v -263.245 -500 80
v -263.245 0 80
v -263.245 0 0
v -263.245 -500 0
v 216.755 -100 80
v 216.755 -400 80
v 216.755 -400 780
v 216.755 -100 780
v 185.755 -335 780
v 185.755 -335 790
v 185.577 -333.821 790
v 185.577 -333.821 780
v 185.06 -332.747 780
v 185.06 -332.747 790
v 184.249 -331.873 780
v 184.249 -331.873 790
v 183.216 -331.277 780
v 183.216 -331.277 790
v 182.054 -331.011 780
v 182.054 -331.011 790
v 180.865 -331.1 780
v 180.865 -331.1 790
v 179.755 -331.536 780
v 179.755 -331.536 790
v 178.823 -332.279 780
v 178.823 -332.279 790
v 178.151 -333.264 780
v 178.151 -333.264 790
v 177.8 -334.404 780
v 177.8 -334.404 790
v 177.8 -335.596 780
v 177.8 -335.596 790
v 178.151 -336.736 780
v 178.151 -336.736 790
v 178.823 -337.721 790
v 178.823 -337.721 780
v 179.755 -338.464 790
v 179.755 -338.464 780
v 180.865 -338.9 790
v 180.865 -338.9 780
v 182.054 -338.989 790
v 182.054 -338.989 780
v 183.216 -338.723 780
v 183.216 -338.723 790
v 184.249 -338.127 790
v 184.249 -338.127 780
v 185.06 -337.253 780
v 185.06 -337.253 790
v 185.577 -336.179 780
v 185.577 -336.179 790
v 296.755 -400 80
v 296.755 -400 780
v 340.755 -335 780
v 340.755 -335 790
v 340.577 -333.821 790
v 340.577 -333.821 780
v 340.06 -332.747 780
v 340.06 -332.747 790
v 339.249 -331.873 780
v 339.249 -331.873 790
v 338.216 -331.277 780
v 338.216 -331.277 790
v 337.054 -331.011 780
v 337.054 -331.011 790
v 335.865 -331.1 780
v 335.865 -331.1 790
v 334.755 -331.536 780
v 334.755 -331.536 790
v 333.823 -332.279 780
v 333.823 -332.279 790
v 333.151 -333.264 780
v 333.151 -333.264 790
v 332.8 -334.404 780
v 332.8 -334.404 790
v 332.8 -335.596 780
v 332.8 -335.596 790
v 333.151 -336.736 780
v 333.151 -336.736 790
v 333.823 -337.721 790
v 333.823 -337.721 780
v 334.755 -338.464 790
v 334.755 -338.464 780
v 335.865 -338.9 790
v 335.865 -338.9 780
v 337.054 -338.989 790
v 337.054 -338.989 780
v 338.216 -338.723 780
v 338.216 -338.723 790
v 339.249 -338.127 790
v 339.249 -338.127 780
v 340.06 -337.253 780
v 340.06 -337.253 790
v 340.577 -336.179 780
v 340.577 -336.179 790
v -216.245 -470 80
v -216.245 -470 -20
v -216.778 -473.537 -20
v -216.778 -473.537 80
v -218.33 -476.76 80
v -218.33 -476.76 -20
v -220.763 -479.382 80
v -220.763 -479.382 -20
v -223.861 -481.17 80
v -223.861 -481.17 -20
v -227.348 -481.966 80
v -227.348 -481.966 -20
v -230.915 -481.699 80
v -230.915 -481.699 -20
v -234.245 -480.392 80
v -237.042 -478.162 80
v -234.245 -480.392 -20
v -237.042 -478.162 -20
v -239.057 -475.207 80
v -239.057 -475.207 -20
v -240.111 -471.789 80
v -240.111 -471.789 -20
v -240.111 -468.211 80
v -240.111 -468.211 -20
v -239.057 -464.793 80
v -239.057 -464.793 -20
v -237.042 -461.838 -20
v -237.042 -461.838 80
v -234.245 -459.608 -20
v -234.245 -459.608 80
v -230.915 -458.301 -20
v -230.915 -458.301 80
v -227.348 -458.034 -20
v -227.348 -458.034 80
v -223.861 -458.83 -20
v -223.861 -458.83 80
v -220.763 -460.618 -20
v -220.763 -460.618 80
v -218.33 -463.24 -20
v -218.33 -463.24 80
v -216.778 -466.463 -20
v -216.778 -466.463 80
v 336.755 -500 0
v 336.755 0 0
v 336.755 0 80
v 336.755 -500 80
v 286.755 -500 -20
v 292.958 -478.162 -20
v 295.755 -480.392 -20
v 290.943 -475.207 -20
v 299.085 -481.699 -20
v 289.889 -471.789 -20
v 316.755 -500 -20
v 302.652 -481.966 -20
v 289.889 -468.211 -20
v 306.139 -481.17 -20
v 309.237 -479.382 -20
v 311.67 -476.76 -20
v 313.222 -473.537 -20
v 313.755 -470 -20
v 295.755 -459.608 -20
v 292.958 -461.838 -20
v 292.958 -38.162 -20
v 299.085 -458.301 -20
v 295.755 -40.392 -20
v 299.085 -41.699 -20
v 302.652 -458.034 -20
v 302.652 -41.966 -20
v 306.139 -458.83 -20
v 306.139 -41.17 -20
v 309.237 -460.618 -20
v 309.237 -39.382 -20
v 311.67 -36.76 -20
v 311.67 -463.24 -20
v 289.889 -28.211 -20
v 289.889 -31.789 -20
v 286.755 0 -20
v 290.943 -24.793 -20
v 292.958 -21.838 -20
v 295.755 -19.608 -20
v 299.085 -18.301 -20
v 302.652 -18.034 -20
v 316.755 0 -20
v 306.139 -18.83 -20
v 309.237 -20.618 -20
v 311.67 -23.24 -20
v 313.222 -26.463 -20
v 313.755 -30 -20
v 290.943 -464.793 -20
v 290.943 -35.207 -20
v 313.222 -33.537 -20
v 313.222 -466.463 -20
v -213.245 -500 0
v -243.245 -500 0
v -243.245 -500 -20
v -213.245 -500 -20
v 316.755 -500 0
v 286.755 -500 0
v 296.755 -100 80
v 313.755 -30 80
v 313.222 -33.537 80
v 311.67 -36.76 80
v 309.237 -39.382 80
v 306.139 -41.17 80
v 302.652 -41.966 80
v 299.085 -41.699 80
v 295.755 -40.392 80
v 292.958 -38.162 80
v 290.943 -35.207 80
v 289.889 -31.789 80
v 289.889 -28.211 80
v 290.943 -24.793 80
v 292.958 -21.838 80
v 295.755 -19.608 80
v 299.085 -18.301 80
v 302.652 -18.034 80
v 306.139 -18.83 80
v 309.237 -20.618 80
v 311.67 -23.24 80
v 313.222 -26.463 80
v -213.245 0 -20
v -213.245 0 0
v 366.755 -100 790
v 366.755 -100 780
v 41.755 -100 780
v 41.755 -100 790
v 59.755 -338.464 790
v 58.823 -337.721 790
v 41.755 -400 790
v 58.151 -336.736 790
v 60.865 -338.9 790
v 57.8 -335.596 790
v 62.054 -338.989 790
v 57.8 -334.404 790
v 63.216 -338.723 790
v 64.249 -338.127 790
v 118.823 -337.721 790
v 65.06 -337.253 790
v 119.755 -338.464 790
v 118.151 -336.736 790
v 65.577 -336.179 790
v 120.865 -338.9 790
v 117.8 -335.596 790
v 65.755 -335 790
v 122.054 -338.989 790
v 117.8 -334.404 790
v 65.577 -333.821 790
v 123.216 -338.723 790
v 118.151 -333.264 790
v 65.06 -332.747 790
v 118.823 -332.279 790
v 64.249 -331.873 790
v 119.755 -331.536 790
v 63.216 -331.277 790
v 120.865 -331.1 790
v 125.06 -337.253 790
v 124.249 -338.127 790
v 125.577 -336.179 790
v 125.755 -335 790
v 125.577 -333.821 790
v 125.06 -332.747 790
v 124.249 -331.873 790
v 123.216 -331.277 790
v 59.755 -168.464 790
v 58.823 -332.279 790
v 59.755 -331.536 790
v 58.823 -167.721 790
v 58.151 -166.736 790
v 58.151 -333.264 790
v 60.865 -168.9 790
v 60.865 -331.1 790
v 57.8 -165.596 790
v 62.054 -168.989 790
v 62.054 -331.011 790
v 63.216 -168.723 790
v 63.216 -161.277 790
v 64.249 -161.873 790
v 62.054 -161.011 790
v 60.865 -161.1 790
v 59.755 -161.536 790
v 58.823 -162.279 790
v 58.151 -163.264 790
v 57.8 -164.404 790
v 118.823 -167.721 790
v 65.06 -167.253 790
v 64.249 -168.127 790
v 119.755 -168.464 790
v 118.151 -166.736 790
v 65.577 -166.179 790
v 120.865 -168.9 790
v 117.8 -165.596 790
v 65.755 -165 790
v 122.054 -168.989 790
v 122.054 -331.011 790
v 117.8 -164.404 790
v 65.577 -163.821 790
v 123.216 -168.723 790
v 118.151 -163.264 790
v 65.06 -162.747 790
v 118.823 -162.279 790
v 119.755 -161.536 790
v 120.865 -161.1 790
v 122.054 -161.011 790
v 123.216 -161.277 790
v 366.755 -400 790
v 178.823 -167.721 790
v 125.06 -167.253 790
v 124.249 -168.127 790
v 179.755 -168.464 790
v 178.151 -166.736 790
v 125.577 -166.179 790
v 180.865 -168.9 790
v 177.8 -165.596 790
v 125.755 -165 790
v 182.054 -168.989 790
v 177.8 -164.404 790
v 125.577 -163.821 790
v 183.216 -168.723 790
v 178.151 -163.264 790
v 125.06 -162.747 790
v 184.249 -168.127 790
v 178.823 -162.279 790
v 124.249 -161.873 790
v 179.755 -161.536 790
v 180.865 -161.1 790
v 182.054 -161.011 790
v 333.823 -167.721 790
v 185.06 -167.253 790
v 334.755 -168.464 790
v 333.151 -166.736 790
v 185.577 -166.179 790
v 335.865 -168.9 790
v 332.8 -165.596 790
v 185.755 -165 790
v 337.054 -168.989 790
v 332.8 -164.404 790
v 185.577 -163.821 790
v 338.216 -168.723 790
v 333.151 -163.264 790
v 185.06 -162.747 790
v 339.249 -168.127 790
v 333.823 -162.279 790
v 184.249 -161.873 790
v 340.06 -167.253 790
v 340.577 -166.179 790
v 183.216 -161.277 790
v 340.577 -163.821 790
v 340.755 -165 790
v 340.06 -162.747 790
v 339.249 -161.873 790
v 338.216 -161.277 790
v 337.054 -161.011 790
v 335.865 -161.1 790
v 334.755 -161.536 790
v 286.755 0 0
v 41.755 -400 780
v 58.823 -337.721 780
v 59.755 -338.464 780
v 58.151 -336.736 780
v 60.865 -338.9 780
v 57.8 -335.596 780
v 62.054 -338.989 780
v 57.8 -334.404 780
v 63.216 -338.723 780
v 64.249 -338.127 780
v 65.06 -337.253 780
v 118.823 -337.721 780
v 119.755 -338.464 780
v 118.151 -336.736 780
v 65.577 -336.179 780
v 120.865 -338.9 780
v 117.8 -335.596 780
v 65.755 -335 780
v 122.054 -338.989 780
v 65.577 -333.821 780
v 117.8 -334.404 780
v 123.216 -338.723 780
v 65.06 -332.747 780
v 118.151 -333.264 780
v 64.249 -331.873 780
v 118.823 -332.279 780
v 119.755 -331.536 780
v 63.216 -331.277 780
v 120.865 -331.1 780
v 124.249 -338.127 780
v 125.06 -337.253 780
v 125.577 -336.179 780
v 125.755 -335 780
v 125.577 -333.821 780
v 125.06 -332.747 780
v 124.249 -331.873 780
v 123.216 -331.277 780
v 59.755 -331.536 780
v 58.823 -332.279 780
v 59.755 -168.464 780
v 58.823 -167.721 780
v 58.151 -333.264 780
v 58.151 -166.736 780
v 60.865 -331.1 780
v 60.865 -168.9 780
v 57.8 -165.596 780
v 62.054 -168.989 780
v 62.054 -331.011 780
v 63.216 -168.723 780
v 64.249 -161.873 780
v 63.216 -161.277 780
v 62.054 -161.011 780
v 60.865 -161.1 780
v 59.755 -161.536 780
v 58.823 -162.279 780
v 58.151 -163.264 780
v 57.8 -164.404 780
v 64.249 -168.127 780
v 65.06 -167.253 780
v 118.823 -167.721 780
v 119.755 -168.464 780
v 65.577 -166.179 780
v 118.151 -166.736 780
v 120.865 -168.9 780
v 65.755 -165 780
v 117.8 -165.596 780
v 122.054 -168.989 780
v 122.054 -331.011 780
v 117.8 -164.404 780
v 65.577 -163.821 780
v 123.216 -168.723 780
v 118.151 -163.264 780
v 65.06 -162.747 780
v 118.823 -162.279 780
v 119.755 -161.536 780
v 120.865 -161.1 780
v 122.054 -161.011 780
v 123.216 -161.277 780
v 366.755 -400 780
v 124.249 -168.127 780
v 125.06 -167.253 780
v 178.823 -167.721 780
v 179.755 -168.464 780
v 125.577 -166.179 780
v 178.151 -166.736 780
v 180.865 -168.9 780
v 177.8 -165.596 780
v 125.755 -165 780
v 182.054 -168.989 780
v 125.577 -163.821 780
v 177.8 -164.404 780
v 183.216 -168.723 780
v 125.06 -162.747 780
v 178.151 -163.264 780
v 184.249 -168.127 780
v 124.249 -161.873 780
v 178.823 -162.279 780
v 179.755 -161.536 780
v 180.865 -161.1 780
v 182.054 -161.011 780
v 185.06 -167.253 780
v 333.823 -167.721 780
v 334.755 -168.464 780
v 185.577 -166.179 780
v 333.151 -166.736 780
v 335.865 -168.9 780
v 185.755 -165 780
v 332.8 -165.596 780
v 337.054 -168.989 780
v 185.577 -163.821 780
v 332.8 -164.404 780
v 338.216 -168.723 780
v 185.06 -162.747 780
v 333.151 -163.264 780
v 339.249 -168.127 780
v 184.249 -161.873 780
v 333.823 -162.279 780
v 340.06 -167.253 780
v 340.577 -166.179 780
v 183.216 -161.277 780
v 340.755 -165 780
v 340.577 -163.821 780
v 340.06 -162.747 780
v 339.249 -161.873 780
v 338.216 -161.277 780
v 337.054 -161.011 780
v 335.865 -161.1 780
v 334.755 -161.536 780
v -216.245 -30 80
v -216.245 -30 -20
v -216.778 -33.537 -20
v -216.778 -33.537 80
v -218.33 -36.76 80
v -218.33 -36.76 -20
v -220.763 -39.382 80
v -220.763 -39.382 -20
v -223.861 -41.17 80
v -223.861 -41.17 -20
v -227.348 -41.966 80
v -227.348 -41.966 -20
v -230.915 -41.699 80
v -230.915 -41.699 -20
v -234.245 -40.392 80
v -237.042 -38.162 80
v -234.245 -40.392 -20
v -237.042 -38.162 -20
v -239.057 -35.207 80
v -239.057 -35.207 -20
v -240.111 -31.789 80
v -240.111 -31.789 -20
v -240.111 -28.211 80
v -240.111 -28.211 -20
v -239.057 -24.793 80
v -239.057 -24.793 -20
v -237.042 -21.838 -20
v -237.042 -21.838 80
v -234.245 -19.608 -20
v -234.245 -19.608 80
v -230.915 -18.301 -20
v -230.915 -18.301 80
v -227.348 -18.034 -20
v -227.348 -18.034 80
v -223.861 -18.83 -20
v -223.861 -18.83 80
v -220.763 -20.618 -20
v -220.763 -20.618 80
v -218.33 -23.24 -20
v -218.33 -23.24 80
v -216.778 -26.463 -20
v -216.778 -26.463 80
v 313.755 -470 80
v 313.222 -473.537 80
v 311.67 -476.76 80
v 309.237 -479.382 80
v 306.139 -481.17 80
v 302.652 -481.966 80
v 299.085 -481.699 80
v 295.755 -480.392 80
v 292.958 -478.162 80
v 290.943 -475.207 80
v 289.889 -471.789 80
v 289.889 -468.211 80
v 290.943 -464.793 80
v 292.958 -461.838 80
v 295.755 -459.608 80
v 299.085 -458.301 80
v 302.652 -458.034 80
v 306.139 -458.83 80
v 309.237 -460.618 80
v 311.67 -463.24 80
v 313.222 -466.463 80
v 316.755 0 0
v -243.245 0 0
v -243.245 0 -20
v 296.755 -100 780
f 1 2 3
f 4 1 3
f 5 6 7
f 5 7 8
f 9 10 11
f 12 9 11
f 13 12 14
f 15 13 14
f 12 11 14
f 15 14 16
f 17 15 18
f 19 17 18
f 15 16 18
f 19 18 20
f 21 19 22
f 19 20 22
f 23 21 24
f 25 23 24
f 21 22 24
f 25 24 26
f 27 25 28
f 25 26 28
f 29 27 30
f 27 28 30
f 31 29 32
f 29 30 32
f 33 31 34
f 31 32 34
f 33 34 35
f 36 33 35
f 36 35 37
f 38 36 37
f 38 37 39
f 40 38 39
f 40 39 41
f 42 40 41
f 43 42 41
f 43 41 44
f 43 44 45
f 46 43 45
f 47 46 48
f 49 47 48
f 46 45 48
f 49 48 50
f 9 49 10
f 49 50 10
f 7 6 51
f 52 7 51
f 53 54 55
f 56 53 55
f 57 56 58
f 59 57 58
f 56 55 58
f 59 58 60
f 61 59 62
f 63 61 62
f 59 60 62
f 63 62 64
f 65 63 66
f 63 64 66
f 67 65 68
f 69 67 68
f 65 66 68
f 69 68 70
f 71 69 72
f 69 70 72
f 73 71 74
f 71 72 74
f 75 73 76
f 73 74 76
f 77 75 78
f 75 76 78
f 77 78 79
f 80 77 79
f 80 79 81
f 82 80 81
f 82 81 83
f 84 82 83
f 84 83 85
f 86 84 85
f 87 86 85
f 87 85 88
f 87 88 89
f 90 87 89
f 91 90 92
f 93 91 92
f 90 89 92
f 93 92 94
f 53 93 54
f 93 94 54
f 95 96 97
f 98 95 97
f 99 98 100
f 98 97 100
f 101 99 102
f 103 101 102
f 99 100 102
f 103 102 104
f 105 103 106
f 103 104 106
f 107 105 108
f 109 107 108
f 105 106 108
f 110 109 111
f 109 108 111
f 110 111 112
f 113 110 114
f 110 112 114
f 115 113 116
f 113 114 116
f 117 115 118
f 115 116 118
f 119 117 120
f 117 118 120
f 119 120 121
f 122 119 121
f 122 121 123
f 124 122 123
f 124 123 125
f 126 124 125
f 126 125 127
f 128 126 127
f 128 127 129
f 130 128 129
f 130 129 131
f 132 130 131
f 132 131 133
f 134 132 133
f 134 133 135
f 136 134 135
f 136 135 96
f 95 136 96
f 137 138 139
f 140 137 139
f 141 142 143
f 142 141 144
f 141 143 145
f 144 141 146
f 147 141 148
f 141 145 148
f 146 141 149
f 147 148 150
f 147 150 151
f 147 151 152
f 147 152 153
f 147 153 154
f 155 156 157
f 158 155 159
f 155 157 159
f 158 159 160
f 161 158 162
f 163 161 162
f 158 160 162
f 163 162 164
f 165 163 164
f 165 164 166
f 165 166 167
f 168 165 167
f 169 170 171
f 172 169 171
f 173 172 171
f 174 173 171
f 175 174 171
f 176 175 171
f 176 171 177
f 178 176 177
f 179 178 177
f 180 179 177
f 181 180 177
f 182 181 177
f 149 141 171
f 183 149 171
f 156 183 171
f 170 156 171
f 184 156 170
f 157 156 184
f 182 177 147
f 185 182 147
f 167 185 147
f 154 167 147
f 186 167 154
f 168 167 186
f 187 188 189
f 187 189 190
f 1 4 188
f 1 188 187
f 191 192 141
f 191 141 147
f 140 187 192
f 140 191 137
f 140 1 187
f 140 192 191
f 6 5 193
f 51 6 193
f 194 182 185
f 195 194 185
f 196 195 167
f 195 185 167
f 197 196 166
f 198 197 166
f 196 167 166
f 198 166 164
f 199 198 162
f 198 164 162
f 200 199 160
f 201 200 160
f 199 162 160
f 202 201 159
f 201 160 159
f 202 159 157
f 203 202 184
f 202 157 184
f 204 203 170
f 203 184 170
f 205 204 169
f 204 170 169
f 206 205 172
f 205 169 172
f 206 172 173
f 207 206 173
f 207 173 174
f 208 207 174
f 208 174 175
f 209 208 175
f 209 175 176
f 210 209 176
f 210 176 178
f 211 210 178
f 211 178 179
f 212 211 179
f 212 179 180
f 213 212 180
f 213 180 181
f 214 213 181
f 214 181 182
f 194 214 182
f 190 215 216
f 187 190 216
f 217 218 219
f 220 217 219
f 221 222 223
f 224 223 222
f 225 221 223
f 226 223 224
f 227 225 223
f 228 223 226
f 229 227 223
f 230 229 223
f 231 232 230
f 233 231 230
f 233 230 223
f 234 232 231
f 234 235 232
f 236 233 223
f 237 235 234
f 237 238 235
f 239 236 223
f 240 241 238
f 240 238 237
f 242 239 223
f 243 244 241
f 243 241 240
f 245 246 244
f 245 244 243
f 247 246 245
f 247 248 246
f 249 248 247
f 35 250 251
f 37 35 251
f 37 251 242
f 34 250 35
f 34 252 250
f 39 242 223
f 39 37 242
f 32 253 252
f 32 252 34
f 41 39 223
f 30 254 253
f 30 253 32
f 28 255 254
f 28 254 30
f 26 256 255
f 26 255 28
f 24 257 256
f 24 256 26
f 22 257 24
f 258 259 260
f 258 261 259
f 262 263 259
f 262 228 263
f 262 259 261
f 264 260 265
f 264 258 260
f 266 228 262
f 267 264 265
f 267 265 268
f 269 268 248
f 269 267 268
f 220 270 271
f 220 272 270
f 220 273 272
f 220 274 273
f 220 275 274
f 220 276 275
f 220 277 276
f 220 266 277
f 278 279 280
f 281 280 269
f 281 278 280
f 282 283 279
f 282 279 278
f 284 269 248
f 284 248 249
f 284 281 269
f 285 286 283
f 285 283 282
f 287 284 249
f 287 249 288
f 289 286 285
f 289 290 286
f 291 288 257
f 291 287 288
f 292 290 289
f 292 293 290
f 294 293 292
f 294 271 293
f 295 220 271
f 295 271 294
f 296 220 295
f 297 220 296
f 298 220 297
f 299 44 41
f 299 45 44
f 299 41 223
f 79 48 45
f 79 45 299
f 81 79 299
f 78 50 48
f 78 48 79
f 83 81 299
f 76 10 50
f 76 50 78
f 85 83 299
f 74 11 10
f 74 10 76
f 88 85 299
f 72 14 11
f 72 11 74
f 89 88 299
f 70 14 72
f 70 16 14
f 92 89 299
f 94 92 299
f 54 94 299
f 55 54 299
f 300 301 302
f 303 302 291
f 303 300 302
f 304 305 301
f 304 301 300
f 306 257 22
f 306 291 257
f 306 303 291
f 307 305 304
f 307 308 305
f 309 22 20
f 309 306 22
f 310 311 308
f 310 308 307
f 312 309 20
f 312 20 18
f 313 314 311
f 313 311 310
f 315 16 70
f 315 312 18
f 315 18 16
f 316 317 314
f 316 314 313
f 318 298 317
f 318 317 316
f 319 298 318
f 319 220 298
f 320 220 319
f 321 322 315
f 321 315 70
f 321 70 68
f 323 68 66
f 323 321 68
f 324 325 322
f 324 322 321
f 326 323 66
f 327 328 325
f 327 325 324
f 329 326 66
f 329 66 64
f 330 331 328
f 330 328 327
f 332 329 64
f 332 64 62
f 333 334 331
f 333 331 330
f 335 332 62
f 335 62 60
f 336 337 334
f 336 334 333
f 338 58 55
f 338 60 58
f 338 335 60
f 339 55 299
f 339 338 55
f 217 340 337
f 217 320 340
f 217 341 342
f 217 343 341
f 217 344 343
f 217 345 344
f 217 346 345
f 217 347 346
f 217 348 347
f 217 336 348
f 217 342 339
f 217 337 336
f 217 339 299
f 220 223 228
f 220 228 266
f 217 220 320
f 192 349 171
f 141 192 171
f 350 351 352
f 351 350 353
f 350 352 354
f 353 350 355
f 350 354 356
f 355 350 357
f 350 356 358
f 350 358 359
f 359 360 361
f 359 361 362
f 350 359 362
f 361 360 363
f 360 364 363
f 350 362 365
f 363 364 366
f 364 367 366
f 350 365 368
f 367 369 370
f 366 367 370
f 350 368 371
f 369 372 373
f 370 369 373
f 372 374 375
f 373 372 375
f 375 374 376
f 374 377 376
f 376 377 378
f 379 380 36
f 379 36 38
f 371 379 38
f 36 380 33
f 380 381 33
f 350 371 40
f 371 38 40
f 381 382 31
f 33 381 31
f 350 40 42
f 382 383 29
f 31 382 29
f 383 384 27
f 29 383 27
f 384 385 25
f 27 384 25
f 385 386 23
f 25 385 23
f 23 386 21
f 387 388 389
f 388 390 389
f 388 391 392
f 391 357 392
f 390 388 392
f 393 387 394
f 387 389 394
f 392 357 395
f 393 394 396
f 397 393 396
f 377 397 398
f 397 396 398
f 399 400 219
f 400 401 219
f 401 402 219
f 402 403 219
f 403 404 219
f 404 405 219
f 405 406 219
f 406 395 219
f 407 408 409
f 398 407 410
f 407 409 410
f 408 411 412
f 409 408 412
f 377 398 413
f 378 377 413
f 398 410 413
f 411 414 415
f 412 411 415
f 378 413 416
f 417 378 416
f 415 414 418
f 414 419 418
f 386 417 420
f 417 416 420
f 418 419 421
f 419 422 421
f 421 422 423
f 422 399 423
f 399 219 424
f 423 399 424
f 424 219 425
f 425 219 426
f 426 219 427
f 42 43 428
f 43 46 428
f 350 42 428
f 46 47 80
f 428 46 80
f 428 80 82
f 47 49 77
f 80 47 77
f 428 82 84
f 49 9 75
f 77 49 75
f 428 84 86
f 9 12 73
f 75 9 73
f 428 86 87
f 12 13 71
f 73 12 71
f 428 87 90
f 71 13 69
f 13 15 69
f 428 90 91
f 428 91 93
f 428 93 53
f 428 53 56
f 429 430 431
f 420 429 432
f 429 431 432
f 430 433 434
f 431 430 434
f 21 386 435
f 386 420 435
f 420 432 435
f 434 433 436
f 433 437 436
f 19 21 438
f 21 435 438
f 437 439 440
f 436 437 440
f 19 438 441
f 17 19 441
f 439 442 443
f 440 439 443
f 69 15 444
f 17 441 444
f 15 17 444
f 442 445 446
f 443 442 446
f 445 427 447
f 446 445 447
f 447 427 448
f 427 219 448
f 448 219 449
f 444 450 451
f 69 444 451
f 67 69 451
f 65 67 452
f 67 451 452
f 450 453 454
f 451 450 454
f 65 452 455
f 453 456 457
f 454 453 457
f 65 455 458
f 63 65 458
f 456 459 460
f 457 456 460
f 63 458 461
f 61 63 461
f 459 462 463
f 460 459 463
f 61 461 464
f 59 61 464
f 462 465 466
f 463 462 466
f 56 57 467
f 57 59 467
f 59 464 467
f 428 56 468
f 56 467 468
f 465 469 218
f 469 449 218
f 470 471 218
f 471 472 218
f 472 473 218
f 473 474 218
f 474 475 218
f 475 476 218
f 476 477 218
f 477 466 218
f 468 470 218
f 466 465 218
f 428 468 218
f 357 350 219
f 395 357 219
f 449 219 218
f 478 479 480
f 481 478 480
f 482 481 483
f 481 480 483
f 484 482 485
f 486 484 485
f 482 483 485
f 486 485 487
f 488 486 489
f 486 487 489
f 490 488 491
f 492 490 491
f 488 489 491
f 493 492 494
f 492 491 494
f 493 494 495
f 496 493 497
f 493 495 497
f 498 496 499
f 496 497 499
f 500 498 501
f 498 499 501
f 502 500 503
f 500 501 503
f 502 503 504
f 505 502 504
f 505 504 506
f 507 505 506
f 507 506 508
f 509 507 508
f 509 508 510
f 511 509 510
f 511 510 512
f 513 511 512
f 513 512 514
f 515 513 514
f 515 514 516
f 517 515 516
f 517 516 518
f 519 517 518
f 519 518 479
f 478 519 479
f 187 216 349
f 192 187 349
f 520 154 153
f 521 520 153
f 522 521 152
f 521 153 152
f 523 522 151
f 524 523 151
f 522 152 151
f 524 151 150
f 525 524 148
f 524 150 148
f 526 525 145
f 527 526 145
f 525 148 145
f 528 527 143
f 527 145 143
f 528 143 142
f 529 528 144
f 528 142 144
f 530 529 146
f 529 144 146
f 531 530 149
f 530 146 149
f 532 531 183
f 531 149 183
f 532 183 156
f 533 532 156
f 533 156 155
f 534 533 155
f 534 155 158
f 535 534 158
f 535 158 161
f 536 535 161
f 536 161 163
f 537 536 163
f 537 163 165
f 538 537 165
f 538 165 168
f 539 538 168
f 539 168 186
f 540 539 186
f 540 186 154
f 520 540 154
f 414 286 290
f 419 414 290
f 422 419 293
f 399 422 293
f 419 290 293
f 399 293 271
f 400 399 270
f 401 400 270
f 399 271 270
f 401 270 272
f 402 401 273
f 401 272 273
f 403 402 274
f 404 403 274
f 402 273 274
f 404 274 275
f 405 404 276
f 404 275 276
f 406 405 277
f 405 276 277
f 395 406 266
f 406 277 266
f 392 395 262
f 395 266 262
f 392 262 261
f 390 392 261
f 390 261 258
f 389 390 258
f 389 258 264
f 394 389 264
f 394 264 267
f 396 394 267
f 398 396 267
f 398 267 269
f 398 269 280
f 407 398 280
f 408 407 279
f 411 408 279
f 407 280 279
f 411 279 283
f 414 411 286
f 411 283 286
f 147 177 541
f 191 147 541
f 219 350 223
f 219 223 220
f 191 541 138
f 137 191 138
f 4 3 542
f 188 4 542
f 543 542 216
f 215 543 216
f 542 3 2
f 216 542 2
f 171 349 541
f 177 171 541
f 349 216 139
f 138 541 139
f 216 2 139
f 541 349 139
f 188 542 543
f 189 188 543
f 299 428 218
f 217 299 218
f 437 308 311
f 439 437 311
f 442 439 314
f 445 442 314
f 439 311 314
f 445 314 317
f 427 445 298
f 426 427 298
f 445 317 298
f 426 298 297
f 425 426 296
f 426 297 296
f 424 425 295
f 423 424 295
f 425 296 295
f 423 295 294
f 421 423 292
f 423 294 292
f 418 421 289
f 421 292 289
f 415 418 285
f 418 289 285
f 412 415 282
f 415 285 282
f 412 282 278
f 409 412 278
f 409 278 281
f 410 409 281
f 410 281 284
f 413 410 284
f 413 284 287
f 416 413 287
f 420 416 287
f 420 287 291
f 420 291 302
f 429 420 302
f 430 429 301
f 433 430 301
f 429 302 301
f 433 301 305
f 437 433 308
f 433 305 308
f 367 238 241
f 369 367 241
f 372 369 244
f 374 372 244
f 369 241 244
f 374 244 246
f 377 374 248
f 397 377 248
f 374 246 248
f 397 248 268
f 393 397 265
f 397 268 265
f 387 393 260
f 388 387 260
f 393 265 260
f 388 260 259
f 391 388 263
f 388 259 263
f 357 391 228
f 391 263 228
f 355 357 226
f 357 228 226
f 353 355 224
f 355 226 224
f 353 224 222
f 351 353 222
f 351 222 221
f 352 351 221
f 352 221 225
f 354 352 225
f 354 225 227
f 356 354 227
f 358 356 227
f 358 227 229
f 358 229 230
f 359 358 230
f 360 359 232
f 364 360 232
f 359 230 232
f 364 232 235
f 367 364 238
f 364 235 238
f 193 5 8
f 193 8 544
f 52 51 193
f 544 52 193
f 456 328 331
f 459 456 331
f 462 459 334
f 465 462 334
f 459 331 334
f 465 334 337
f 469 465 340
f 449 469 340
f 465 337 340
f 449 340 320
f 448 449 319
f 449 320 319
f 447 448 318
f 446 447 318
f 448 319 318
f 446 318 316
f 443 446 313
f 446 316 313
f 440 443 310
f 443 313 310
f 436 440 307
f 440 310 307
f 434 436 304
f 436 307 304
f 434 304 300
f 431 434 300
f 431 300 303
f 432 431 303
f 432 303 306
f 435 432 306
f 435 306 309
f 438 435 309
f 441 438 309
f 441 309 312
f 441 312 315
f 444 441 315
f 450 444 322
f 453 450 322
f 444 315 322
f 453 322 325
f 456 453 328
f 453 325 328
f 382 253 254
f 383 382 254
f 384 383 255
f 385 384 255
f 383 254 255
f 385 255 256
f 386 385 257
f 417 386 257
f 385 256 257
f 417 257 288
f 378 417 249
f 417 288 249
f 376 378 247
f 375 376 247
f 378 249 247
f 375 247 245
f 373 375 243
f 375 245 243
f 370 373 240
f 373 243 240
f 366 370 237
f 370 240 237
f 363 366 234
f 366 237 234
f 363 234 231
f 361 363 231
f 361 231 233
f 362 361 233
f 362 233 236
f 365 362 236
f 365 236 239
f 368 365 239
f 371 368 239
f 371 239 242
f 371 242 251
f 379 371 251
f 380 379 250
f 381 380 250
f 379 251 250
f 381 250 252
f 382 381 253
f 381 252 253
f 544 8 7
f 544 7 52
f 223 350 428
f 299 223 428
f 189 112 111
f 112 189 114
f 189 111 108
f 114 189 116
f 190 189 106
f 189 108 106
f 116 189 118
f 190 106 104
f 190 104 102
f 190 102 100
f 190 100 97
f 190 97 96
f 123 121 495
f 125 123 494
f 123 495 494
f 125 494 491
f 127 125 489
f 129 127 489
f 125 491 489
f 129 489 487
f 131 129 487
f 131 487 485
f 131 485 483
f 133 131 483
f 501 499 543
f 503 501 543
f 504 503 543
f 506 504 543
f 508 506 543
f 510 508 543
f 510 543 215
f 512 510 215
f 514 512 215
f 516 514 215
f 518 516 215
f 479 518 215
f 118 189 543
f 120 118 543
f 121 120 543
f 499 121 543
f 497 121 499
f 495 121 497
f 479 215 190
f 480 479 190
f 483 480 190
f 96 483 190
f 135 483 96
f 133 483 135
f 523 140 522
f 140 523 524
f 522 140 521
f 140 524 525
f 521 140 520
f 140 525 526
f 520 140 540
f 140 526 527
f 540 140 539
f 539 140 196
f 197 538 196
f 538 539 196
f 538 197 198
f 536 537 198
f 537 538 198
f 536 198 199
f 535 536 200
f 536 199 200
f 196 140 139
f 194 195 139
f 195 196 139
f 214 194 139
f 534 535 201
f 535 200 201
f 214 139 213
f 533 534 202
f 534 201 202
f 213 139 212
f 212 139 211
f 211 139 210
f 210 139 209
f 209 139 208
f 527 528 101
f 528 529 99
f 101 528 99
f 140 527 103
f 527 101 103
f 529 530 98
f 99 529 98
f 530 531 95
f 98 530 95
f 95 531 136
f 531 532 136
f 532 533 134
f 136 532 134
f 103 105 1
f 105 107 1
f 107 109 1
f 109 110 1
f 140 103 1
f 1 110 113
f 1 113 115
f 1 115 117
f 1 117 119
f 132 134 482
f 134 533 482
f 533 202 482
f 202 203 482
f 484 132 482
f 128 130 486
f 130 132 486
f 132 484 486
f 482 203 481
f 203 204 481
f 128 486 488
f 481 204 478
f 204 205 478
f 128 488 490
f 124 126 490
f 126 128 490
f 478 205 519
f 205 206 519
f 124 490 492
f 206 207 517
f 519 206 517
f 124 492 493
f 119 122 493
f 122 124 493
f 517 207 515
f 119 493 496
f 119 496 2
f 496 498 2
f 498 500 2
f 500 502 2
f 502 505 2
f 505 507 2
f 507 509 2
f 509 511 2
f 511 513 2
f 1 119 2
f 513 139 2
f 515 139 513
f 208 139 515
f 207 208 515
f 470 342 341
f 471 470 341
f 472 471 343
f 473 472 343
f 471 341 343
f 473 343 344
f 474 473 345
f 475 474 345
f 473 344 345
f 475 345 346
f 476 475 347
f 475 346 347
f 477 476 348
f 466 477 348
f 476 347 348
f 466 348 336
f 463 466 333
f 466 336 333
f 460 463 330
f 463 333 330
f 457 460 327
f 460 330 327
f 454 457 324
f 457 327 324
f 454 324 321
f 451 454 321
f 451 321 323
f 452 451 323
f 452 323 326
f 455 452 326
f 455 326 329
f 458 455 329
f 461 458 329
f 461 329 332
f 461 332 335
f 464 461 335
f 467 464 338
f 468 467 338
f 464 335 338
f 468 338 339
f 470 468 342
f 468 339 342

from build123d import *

# Parameters (mm, degrees)
F1_DEPTH  = 500
F4_R      = 12
F3_R      = 12
F5_DEPTH  = 100.001
F2_W      = 80
F2_H      = 300
F6_DEPTH  = 700
F7_W      = 80
F7_H      = 300
F7_W_2    = 175
F7_W_3    = 70
F8_DEPTH  = 10
F9_R      = 4
F10_DEPTH = 10


with BuildPart() as f1:
    # F0 (on Front) → F1 (new body)
    with BuildSketch(Plane.XZ):
        Polygon((336.7550126589, 80), (-263.2449873411, 80), (-263.2449873411, 0), (-243.2449873411, 0), (-243.2449873411, -20), (-213.2449873411, -20), (-213.2449873411, 0), (286.7550126589, 0), (286.7550126589, -20), (316.7550126589, -20), (316.7550126589, 0), (336.7550126589, 0), align=None)
    extrude(amount=F1_DEPTH)

    # F4 (on face) + F3 (on face) → F5 (cut, through all)
    with BuildSketch(Plane(origin=(0, 0, -20), x_dir=(1, 0, 0), z_dir=(0, 0, -1))):
        with Locations((301.7550126589, 470)):
            Circle(F4_R)
        with Locations((301.7550126589, 30)):
            Circle(F4_R)
    with BuildSketch(Plane(origin=(0, 0, -20), x_dir=(1, 0, 0), z_dir=(0, 0, -1))):
        with Locations((-228.2449873411, 30)):
            Circle(F3_R)
        with Locations((-228.2449873411, 470)):
            Circle(F3_R)
    extrude(amount=-F5_DEPTH, mode=Mode.SUBTRACT)


with BuildPart() as f6:
    # F2 (on face) → F6 (new body)
    with BuildSketch(Plane.XY.offset(80)):
        with Locations((256.7550126589, -250)):
            Rectangle(F2_W, F2_H)
    extrude(amount=F6_DEPTH)


with BuildPart() as f8:
    # F7 (on face) → F8 (new body)
    with BuildSketch(Plane.XY.offset(780)):
        with Locations((256.7550126589, -250)):
            Rectangle(F7_W, F7_H)
        with Locations((129.2550126589, -250)):
            Rectangle(F7_W_2, F7_H)
        with Locations((331.7550126589, -250)):
            Rectangle(F7_W_3, F7_H)
    extrude(amount=F8_DEPTH)

    # F9 (on face) → F10 (cut)
    with BuildSketch(Plane.XY.offset(790)):
        with Locations((121.7550126589, -335)):
            Circle(F9_R)
        with Locations((61.7550126589, -335)):
            Circle(F9_R)
        with Locations((181.7550126589, -335)):
            Circle(F9_R)
        with Locations((336.7550126589, -335)):
            Circle(F9_R)
        with Locations((336.7550126589, -165)):
            Circle(F9_R)
        with Locations((181.7550126589, -165)):
            Circle(F9_R)
        with Locations((121.7550126589, -165)):
            Circle(F9_R)
        with Locations((61.7550126589, -165)):
            Circle(F9_R)
    extrude(amount=-F10_DEPTH, mode=Mode.SUBTRACT)


solid = Compound([f1.part, f6.part, f8.part])
